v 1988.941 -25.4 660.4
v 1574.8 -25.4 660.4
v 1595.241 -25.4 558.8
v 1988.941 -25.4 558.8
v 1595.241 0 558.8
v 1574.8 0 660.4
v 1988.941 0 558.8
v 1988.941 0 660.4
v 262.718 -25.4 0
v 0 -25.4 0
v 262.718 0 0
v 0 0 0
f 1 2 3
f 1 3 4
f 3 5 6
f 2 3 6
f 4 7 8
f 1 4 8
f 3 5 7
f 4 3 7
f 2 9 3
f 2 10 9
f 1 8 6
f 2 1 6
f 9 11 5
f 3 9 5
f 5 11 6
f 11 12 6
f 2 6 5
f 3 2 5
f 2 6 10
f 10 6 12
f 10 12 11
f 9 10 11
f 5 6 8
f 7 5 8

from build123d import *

# Parameters (mm, degrees)
F1_DEPTH = 25.4
F2_DEPTH = 25.4


# Not quite as in the source:
# - a feature names something its author has since deleted; it is built from what else it names


with BuildPart() as f1:
    # F0 (on Front) → F1 (new body)
    with BuildSketch(Plane.XZ):
        Polygon((1574.8, 660.4), (0, 0), (262.7178476153, 0), (1574.8, 550.2279993871), align=None)
        Polygon((1595.2409245384, 558.8), (1574.8, 660.4), (1574.8, 550.2279993871), align=None)
    extrude(amount=F1_DEPTH)


with BuildPart() as f2:
    # F0 (on Front) → F2 (new body)
    with BuildSketch(Plane.XZ):
        Polygon((1988.9409245384, 660.4), (1574.8, 660.4), (1595.2409245384, 558.8), (1988.9409245384, 558.8), align=None)
    extrude(amount=F2_DEPTH)


solid = Compound([f1.part, f2.part])
